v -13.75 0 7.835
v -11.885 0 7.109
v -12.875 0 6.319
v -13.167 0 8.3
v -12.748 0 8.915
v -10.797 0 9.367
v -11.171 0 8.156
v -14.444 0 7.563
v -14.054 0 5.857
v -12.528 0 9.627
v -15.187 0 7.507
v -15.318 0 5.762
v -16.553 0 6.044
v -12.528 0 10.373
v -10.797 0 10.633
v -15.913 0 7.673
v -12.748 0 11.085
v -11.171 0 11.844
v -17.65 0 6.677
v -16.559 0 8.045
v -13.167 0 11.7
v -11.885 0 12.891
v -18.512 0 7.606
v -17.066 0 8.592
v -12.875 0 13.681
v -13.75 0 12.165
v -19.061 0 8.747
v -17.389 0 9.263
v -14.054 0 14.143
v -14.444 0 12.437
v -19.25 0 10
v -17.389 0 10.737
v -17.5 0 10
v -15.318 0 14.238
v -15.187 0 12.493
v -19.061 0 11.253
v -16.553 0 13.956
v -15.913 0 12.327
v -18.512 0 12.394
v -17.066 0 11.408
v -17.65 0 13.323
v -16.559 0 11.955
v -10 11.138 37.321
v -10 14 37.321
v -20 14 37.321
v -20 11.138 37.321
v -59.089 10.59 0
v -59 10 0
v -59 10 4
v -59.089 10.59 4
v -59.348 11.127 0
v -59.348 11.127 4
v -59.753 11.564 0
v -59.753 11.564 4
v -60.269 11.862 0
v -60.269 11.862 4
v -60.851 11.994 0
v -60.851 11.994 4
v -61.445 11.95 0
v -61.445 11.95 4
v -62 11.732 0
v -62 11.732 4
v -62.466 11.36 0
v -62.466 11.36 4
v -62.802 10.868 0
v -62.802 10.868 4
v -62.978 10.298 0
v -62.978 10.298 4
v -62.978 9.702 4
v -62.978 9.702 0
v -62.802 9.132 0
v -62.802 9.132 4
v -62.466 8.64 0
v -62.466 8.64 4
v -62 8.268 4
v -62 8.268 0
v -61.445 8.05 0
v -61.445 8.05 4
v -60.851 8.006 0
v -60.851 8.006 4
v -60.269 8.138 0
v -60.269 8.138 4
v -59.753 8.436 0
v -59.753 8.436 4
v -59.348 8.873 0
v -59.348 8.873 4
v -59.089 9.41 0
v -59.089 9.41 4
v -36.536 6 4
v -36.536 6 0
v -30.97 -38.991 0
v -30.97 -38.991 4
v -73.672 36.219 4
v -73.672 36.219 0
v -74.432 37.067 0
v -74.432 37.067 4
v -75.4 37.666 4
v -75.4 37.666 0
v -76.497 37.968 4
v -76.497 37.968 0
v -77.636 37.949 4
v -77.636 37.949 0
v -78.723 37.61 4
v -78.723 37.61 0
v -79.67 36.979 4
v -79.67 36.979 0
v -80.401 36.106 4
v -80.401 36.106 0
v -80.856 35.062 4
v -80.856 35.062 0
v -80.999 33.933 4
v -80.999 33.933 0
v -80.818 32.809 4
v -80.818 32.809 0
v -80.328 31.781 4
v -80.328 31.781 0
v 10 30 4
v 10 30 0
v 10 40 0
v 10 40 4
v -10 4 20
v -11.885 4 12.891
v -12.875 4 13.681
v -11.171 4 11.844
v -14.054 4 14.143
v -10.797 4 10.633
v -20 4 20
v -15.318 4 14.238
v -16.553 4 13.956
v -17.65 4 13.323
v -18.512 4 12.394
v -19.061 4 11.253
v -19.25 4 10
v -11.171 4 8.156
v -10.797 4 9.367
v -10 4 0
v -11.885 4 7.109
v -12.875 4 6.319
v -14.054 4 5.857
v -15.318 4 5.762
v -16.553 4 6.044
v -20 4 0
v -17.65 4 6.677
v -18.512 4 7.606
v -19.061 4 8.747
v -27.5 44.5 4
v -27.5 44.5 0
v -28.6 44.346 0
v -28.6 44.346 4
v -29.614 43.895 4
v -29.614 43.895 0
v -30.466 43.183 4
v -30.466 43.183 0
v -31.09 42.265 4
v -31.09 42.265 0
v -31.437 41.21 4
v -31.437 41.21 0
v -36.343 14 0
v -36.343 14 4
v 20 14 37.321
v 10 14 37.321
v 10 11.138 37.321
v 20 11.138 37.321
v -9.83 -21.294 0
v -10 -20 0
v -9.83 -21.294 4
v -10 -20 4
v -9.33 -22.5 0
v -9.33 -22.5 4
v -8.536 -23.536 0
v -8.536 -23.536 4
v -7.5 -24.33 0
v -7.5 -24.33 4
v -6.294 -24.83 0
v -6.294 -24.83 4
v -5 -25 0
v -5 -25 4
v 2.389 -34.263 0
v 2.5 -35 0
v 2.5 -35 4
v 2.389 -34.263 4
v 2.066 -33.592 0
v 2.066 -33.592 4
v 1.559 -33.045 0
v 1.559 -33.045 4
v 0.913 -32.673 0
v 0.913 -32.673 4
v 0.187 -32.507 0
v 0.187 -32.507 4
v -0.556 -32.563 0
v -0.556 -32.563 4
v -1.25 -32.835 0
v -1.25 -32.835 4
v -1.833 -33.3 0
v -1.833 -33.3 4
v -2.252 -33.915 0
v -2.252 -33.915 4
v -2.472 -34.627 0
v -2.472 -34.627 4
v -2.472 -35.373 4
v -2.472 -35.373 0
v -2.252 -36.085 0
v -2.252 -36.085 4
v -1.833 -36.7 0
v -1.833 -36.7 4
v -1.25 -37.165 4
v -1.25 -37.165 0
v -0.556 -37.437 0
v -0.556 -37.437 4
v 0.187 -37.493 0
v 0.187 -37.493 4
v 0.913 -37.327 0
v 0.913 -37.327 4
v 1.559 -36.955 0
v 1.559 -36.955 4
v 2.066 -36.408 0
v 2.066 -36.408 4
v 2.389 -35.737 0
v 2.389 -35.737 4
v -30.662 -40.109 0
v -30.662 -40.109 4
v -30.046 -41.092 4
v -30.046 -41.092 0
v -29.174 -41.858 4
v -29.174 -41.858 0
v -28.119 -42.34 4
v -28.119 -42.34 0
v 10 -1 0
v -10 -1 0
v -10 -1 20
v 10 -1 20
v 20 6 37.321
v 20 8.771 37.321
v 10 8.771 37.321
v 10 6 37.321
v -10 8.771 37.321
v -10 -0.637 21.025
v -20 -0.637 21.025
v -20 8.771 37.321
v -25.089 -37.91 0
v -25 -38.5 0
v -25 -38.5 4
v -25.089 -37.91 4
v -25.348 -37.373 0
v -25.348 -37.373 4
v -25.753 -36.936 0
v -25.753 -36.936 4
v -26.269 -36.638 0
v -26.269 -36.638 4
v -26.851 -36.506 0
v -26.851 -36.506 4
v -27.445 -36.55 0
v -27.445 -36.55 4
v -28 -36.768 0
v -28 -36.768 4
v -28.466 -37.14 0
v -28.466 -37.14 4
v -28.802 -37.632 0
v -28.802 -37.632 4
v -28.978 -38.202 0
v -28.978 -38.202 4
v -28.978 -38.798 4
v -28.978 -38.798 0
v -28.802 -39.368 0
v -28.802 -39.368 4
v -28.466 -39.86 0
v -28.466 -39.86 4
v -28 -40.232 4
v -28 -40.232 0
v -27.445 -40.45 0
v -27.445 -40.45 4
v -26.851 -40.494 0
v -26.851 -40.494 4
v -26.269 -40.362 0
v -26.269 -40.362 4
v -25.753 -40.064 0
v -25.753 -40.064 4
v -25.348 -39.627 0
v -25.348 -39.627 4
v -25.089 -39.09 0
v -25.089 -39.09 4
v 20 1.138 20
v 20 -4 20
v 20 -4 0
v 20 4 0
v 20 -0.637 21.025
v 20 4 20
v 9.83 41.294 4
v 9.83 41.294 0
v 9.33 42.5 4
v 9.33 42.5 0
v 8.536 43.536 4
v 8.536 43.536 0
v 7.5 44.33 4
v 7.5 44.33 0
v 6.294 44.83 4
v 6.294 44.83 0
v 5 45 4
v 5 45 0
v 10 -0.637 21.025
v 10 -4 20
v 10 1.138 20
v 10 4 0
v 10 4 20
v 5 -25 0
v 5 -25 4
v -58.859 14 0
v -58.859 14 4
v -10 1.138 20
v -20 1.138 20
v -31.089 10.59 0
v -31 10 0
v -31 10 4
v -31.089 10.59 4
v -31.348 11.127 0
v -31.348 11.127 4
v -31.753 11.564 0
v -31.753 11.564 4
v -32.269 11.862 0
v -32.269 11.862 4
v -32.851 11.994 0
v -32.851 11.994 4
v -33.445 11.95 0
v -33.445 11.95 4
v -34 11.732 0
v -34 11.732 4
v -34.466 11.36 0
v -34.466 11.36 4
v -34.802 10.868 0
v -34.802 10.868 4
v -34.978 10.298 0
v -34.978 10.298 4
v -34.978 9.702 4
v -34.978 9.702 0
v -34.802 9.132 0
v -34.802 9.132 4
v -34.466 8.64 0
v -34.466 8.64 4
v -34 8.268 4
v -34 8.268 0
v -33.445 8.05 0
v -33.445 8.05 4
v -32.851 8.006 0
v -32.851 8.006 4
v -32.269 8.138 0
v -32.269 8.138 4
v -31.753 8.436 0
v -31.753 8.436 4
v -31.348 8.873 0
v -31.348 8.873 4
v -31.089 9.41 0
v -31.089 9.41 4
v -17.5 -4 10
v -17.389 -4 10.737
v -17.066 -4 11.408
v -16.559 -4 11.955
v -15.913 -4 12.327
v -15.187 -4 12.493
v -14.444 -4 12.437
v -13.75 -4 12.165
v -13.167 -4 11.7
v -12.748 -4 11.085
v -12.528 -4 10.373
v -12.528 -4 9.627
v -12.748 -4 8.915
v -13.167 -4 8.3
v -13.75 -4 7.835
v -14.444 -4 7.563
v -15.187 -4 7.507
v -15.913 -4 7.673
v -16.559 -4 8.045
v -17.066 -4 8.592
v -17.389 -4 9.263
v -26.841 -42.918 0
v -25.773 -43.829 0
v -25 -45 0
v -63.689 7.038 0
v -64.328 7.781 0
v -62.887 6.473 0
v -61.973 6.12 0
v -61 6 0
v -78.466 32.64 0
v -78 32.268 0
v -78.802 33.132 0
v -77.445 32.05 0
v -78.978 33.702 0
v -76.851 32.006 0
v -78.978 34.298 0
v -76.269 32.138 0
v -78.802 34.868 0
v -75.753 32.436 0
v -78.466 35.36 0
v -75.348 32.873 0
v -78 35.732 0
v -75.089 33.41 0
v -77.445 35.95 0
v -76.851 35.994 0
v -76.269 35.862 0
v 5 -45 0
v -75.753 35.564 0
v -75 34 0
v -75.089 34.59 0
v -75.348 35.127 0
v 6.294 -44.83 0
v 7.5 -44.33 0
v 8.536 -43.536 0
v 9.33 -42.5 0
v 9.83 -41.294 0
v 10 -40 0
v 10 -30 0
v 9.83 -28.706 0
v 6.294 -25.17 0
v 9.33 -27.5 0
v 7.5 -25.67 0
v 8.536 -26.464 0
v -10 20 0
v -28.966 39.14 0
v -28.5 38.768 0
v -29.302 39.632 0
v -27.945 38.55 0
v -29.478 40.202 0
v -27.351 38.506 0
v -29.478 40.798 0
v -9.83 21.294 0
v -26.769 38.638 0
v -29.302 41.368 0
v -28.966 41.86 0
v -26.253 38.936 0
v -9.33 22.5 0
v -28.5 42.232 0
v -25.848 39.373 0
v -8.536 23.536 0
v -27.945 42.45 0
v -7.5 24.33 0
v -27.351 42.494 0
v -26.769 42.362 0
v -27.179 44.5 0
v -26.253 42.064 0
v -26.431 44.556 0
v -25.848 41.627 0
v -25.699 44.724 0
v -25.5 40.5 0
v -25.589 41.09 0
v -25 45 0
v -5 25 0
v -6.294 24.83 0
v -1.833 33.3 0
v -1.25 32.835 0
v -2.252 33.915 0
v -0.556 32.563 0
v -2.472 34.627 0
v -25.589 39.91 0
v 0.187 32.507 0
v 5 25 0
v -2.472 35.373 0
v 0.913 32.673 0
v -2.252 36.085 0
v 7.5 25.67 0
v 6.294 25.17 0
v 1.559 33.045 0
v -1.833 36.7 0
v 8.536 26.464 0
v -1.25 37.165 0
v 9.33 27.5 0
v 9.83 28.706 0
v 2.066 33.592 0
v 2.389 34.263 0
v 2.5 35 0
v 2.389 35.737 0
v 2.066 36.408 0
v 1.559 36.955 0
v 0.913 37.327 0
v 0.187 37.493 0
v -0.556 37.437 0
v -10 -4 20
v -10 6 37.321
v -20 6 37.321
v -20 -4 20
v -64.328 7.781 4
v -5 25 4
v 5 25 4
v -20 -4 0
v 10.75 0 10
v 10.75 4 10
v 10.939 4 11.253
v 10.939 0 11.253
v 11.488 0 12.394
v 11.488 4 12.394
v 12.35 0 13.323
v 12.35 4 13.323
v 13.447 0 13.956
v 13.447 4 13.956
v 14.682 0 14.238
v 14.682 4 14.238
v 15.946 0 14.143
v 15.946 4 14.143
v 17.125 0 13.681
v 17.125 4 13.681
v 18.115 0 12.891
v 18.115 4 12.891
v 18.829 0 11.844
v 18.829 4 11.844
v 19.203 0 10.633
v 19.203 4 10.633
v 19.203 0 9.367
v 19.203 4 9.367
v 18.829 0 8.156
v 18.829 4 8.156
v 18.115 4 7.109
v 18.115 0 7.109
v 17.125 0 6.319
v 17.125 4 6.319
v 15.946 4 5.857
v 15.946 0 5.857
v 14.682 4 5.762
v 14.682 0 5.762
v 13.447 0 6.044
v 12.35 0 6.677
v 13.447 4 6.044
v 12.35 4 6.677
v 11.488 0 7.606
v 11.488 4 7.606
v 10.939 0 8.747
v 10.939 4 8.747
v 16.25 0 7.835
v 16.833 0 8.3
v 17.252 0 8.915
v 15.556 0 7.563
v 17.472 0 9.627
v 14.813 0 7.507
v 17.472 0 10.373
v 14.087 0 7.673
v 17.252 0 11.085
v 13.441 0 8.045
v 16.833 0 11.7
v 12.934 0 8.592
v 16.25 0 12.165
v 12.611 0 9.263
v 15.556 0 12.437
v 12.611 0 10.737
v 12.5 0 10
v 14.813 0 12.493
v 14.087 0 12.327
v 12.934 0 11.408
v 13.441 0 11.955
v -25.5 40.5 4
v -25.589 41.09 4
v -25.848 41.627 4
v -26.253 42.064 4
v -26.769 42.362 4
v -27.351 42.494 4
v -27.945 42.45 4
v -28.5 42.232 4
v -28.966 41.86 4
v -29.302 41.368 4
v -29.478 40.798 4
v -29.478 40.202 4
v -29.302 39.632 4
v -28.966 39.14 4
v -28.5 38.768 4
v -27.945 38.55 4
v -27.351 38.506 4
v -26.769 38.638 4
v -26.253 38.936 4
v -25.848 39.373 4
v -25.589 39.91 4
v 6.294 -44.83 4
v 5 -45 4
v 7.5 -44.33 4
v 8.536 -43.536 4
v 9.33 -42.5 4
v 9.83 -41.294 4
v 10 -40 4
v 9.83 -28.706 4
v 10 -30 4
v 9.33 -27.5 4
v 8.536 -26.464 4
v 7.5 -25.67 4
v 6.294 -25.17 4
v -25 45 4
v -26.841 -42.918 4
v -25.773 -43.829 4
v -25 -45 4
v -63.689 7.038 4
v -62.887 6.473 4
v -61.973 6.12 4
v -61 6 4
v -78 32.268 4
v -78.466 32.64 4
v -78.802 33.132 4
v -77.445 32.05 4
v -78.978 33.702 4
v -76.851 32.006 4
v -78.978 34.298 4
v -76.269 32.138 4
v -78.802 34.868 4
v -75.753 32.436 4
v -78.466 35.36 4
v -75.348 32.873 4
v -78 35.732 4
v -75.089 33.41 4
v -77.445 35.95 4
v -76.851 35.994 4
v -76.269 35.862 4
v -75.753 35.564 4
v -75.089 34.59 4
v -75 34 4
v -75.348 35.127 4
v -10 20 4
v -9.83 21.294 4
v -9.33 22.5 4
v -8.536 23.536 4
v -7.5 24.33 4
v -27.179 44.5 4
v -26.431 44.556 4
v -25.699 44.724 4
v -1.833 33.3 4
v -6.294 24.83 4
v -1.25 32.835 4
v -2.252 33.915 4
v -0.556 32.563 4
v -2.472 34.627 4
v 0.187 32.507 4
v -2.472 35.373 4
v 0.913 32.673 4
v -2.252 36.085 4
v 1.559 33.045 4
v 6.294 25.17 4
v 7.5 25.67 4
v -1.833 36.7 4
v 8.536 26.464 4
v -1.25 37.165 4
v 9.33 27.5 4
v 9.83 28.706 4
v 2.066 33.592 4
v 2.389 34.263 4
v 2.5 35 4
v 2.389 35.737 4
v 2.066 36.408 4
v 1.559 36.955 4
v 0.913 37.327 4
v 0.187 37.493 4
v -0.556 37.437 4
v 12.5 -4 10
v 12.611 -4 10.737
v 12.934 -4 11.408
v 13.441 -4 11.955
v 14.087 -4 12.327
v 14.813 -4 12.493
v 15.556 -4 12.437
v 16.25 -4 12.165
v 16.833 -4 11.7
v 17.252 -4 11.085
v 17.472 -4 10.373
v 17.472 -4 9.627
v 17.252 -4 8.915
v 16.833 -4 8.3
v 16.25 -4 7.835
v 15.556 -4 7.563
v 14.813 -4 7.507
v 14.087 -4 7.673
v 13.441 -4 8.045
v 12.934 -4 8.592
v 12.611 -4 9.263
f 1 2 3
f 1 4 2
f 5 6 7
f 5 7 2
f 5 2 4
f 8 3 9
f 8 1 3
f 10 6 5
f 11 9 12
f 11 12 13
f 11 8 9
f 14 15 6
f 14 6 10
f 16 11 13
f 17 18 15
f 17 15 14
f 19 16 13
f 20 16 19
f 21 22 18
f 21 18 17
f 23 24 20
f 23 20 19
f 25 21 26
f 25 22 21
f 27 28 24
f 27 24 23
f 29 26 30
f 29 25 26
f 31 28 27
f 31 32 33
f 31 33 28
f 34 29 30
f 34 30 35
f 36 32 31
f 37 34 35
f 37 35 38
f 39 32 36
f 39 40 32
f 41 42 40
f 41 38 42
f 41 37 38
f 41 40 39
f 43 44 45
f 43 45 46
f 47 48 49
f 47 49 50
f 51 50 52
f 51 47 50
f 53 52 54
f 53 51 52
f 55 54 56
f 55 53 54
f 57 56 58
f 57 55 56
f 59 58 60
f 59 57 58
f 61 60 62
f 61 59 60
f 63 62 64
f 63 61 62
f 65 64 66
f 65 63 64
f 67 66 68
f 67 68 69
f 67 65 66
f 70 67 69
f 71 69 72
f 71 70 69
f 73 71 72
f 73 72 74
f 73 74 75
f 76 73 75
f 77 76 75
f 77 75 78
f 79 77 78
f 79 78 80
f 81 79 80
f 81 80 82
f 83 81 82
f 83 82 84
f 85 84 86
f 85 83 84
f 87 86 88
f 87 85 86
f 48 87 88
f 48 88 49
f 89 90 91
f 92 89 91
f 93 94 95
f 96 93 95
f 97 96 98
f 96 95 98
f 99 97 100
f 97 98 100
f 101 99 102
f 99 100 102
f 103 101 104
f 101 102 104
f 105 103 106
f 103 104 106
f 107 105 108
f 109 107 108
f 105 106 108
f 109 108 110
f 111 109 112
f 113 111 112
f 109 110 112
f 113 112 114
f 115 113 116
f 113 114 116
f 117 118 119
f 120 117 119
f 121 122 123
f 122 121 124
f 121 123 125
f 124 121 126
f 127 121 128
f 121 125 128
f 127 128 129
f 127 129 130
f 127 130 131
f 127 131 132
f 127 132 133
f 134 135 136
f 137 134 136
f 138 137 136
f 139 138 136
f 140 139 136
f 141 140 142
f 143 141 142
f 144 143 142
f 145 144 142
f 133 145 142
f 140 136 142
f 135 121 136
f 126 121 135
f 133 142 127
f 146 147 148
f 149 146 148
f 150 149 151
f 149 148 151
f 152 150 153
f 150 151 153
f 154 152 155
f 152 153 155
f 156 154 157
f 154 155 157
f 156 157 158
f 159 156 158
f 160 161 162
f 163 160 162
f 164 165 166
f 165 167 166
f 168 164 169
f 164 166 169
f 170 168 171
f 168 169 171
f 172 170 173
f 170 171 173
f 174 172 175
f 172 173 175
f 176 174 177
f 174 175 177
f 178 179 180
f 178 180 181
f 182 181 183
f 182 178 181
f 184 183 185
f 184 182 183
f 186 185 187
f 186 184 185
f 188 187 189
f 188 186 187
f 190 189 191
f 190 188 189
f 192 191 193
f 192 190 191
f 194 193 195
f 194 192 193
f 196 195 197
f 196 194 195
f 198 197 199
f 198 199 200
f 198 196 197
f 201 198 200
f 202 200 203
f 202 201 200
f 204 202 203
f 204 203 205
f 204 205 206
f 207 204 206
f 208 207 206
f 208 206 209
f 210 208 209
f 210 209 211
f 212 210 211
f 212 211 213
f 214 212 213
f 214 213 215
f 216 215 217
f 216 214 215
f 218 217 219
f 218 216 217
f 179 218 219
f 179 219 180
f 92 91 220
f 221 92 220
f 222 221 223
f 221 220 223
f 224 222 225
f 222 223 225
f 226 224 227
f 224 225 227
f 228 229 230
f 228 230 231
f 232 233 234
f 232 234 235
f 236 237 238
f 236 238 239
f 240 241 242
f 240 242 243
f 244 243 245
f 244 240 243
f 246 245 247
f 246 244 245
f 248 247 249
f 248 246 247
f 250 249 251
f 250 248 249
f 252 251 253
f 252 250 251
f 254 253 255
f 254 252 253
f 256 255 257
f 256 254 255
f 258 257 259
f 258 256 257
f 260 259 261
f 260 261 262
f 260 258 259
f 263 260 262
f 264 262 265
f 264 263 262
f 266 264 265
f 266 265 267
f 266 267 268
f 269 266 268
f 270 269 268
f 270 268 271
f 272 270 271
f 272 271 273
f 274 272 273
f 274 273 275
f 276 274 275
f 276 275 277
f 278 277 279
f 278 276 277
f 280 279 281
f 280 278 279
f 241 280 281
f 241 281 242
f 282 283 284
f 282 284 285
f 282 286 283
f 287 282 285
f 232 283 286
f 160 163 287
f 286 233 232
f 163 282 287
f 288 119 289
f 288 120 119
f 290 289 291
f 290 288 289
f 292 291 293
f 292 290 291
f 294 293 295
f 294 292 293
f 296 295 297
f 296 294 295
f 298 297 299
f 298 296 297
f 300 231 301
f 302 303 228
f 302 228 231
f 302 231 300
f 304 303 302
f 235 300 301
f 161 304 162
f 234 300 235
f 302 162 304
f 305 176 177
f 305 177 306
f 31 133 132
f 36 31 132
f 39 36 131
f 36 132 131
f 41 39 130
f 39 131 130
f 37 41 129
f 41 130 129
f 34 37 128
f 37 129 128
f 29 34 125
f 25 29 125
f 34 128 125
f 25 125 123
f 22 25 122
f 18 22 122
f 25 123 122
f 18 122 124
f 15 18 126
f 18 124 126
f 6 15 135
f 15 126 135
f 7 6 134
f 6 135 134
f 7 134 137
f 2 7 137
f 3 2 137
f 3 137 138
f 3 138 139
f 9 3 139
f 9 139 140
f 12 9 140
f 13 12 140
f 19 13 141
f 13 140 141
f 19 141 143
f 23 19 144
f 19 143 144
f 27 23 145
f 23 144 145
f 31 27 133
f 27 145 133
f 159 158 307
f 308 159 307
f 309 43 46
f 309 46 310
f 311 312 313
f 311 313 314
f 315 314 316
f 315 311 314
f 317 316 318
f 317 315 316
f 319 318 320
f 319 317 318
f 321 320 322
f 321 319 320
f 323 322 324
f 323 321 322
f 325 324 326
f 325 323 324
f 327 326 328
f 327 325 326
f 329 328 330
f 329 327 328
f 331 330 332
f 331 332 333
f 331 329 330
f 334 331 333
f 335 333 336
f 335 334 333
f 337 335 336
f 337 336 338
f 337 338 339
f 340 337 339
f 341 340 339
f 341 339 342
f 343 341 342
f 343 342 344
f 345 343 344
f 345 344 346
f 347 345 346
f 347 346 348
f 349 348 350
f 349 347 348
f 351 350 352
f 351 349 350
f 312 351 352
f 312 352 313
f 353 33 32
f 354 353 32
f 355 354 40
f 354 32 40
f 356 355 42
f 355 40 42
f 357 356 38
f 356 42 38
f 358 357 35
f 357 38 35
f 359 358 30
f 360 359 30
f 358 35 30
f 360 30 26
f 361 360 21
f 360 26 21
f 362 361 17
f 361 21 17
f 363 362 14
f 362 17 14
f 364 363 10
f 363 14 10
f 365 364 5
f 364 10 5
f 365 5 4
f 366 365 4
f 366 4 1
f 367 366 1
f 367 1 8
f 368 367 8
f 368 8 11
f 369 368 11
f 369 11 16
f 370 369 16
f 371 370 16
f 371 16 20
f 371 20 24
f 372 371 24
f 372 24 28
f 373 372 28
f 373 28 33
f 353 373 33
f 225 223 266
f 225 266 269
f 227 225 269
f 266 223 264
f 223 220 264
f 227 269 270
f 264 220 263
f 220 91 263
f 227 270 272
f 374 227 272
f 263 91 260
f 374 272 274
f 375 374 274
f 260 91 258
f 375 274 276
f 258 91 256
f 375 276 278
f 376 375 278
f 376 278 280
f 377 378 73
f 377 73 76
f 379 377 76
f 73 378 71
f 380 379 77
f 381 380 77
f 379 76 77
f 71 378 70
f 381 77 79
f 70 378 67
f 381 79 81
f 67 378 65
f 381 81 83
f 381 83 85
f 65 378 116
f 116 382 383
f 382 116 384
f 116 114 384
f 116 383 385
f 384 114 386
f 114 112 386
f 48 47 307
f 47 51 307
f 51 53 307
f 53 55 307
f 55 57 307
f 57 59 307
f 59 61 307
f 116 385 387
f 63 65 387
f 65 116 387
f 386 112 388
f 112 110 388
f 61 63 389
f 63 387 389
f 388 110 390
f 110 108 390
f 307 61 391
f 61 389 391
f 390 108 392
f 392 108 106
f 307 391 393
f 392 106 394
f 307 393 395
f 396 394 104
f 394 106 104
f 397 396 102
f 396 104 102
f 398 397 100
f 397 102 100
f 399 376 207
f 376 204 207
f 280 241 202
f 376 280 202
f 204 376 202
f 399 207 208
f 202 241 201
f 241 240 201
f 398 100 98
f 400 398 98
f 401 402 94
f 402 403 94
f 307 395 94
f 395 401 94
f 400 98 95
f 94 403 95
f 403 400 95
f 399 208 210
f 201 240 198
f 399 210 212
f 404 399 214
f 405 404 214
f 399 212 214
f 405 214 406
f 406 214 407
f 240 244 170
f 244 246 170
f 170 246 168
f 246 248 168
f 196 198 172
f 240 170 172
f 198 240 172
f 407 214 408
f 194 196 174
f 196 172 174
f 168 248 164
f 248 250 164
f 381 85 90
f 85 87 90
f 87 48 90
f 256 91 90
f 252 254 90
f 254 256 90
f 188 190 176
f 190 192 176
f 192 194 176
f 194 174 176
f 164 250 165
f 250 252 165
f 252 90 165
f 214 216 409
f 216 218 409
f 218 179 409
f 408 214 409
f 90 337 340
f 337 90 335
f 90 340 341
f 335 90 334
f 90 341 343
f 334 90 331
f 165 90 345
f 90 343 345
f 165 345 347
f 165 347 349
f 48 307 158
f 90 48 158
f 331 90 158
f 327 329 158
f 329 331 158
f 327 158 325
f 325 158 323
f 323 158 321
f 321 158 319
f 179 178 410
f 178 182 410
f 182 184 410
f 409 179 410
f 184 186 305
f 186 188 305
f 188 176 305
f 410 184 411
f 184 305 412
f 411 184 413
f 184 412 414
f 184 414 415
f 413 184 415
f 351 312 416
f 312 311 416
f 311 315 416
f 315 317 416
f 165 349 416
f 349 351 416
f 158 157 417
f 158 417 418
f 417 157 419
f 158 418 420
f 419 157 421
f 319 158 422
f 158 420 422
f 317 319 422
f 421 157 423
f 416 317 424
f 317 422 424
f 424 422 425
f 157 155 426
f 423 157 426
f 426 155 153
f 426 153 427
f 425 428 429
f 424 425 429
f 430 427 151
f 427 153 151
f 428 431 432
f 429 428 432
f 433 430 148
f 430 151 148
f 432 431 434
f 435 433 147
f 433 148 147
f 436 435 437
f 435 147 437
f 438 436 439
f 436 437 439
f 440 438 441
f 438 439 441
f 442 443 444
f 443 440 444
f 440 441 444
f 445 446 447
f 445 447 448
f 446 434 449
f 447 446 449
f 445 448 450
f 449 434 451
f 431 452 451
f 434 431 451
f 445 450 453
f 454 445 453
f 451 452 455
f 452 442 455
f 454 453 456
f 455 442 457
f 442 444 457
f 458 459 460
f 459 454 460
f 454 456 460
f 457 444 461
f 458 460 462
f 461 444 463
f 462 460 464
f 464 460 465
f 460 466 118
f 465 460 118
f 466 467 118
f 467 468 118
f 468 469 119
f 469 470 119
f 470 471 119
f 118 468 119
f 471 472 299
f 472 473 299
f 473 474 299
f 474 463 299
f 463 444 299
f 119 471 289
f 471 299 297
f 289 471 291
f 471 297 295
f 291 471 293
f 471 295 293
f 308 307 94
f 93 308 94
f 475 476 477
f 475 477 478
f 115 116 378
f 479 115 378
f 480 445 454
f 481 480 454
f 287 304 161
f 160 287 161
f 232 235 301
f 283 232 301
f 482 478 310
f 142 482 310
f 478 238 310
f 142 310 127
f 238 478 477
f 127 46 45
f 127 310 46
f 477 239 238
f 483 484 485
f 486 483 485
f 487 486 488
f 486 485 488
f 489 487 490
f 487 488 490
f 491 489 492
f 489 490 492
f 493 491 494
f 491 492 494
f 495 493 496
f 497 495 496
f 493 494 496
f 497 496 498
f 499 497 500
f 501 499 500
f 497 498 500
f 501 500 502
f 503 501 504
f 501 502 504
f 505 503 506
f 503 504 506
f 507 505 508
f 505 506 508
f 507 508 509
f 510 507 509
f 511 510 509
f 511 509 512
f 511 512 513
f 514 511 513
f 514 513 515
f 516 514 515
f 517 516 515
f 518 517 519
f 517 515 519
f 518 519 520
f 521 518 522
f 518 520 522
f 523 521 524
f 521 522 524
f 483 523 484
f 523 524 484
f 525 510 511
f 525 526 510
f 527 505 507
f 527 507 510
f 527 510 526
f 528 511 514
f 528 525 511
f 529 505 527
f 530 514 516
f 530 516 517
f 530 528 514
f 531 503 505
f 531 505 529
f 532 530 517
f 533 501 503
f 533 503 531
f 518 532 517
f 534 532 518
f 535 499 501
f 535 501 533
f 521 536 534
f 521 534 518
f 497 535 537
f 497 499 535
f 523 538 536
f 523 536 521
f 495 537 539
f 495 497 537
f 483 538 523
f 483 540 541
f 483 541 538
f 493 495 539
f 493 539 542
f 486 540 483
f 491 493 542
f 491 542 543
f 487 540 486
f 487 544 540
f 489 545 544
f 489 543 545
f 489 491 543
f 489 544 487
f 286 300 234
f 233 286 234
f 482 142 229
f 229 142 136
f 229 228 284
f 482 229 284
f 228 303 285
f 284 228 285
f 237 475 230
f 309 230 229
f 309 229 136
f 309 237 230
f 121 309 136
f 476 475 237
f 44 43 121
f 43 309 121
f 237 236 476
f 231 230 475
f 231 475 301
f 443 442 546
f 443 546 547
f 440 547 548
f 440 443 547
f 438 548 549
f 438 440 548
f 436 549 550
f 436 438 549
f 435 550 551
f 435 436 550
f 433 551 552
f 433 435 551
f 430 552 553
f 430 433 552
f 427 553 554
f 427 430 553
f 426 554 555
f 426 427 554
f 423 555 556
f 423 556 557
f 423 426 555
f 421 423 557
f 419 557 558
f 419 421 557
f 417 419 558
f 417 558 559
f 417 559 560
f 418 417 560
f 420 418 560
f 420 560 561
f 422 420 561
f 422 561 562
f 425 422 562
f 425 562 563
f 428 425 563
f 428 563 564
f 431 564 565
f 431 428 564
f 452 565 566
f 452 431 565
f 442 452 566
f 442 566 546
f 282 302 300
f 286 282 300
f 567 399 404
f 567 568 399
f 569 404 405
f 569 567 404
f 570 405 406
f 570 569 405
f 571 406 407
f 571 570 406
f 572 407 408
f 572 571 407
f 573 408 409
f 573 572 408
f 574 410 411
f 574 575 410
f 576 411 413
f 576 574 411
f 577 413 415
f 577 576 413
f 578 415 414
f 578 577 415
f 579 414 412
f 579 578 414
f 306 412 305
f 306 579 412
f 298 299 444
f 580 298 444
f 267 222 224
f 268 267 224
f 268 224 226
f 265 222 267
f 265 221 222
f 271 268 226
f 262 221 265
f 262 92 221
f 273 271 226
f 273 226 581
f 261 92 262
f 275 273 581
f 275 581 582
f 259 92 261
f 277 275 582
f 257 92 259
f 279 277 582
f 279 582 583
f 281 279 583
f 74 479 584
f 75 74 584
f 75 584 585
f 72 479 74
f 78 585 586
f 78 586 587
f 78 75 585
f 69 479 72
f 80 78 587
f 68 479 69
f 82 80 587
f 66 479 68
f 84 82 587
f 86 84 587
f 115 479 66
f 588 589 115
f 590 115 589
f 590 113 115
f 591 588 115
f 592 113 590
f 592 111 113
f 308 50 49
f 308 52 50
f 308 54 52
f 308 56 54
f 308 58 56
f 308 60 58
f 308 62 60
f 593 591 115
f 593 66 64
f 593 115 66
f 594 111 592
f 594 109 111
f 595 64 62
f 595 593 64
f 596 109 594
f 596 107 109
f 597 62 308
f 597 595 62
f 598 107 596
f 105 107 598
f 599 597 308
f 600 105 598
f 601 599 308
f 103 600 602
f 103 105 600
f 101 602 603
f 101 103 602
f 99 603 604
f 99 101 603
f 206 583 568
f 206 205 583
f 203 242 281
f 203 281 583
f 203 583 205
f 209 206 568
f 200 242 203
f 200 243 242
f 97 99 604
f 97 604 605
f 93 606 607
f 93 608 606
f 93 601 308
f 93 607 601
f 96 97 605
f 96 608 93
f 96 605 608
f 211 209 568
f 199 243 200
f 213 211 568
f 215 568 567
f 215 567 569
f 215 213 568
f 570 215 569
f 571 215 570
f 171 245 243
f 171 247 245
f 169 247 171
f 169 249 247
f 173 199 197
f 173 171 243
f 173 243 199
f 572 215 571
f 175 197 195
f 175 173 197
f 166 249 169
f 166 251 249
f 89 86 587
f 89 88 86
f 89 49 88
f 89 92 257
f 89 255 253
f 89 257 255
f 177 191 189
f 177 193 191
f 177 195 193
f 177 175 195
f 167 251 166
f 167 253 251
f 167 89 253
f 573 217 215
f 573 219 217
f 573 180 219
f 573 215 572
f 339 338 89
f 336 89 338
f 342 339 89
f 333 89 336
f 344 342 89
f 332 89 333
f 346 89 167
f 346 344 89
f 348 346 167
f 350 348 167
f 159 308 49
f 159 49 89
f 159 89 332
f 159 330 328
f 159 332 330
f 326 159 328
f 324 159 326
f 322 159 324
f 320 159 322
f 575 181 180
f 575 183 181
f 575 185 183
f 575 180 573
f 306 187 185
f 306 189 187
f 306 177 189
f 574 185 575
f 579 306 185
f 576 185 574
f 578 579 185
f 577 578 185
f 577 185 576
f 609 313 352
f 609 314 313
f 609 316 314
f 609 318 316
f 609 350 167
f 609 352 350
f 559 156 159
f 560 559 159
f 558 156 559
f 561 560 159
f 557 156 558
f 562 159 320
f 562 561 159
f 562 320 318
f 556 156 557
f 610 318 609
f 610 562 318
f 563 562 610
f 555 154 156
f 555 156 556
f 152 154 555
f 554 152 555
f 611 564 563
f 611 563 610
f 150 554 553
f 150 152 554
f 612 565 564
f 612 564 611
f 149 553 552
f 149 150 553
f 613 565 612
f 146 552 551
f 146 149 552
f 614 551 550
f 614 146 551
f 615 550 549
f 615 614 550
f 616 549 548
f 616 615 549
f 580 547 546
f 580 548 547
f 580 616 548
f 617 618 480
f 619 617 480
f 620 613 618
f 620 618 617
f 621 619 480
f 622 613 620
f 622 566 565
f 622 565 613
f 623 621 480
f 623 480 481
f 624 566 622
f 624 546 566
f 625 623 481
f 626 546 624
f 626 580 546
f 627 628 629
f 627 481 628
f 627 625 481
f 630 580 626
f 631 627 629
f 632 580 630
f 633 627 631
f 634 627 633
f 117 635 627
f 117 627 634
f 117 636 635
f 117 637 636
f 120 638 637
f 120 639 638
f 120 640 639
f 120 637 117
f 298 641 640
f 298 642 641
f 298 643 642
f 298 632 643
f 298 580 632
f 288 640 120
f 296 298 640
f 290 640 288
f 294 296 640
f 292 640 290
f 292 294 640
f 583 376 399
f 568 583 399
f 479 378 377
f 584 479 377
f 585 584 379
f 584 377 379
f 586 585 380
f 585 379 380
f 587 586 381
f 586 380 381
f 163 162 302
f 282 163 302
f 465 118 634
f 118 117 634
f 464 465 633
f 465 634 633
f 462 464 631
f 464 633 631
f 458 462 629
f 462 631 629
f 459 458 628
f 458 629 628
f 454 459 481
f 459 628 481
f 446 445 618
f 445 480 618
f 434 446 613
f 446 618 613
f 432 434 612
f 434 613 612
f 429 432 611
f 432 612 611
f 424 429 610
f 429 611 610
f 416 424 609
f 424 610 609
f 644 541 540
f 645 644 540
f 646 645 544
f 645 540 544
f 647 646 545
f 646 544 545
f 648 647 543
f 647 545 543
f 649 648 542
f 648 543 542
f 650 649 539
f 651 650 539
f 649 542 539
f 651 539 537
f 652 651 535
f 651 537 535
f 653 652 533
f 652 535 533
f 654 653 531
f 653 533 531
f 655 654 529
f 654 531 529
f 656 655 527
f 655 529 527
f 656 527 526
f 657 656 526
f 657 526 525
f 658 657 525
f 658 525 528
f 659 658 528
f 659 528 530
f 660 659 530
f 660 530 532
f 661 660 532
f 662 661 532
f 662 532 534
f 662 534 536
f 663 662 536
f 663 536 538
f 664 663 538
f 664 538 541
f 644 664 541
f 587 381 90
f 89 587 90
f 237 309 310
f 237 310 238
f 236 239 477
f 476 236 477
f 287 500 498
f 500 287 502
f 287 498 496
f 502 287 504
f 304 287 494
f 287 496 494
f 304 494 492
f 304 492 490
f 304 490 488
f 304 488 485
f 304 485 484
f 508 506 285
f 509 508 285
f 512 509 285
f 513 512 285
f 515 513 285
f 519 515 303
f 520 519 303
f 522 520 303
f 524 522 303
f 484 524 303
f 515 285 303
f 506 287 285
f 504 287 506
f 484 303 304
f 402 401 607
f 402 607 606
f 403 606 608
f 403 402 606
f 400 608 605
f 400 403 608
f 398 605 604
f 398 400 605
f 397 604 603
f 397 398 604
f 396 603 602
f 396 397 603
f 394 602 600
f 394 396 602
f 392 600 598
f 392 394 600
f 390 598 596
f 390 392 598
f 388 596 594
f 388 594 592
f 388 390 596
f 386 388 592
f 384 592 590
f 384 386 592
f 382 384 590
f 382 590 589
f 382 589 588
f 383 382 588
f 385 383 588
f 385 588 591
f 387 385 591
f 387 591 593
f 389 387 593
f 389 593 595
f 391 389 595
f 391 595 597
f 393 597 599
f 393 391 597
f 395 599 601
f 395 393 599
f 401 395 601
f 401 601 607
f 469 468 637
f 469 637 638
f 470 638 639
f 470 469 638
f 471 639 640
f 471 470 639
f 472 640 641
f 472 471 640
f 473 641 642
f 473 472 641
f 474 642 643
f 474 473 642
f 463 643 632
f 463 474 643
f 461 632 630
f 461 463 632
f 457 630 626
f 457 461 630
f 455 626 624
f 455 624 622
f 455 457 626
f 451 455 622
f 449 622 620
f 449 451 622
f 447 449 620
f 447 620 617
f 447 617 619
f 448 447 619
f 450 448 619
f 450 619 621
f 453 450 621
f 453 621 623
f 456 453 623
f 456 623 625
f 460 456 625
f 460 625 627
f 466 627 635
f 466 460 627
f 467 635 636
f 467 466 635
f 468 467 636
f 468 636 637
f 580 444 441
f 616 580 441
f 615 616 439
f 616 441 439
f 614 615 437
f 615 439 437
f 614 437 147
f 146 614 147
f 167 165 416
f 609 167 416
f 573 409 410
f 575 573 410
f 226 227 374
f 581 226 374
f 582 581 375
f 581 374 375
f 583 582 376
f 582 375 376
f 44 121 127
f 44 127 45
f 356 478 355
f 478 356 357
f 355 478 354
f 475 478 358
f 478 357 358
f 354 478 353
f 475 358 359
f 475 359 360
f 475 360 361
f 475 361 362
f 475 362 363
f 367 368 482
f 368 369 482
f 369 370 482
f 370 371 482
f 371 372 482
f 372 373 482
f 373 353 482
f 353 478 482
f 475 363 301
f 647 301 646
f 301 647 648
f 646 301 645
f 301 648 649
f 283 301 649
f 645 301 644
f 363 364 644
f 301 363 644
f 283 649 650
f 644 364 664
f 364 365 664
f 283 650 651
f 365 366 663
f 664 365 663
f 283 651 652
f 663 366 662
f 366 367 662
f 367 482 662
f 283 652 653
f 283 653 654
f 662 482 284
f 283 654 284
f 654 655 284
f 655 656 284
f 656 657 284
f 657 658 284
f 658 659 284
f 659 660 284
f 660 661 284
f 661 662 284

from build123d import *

# Parameters (mm, degrees)
F0_W         = 20
F0_H         = 4
F1_DEPTH     = 20
F2_DEPTH     = 20
F4_START     = 10
F4_DEPTH     = 10
F5_START     = -10
F5_DEPTH     = 10
F6_R         = 2.5
F7_DEPTH     = 25
F6_R_2       = 4.25
F8_DEPTH     = 4
F9_DEPTH     = 1
F10_W        = 20
F10_H        = 20
F10_R        = 2.5
F10_R_2      = 2
F11_DEPTH    = 4
F12_T1_DEPTH = 4
F13_R        = 5


# Not quite as in the source:
# - a fillet or chamfer that OpenCascade refuses, or shapes differently, is made with other operations: its cross-section is extruded or revolved along the edge and cut away or added
# - ends of sketch curves that miss each other by under 0.0002 mm in the source are joined


with BuildPart() as f1:
    # F0 (on Top) → F1 (new body)
    with BuildSketch(Plane.XY):
        with Locations((0, -2)):
            Rectangle(F0_W, F0_H)
    extrude(amount=F1_DEPTH)

    # F0 (on Top) → F2 (join)
    with BuildSketch(Plane.XY):
        Polygon((-10, 4), (-20, 4), (-20, -4), (-10, -4), (-10, 0), align=None)
        Polygon((20, 4), (10, 4), (10, 0), (10, -4), (20, -4), align=None)
    extrude(amount=F2_DEPTH)

    # F3 (on Right) → F4 (join)
    with BuildSketch(Plane.YZ.offset(F4_START)):
        Polygon((-4, 20), (-1.2287187079, 20), (-0.636934682, 21.025), (8.7712812921, 37.3205080757), (6, 37.3205080757), align=None)
        Polygon((-1.2287187079, 20), (1.1384173958, 20), (-0.636934682, 21.025), align=None)
        Polygon((1.1384173958, 20), (4, 20), (14, 37.3205080757), (11.1384173958, 37.3205080757), align=None)
    extrude(amount=F4_DEPTH)

    # F3 (on Right) → F5 (join)
    with BuildSketch(Plane.YZ.offset(F5_START)):
        Polygon((1.1384173958, 20), (4, 20), (14, 37.3205080757), (11.1384173958, 37.3205080757), align=None)
        Polygon((-4, 20), (-1.2287187079, 20), (-0.636934682, 21.025), (8.7712812921, 37.3205080757), (6, 37.3205080757), align=None)
        Polygon((-1.2287187079, 20), (1.1384173958, 20), (-0.636934682, 21.025), align=None)
    extrude(amount=-F5_DEPTH)

    # F6 (on face) → F7 (cut)
    with BuildSketch(Plane(origin=(0, 4, 0), x_dir=(-1, 0, 0), z_dir=(0, 1, 0))):
        with Locations((-15, 10)):
            Circle(F6_R)
        with Locations((15, 10)):
            Circle(F6_R)
    extrude(amount=-F7_DEPTH, mode=Mode.SUBTRACT)

    # F6 (on face) → F8 (cut)
    with BuildSketch(Plane(origin=(0, 4, 0), x_dir=(-1, 0, 0), z_dir=(0, 1, 0))):
        with Locations((-15, 10)):
            Circle(F6_R_2)
        with Locations((-15, 10)):
            Circle(F6_R, mode=Mode.SUBTRACT)
        with Locations((15, 10)):
            Circle(F6_R_2)
        with Locations((15, 10)):
            Circle(F6_R, mode=Mode.SUBTRACT)
    extrude(amount=-F8_DEPTH, mode=Mode.SUBTRACT)

    # F9 (cut): a face of the model
    f9_faces = [f1.faces().sort_by_distance(p)[0] for p in [
        (0, 0, 10),
    ]]
    extrude(f9_faces, amount=-F9_DEPTH, mode=Mode.SUBTRACT)


with BuildPart() as f11:
    # F10 (on Top) → F11 (new body)
    with BuildSketch(Plane.XY):
        with Locations((0, 35)):
            Rectangle(F10_W, F10_H)
        with Locations((0, 35)):
            Circle(F10_R, mode=Mode.SUBTRACT)
        with BuildLine():
            Line((-10, 25), (-10, 45))
            Line((-10, 45), (-25, 45))
            Line((-25, 45), (-25, 44.5))
            Line((-25, 44.5), (-25, 43.6224989992))
            ThreePointArc((-25, 43.6224989992), (-23.8944487245, 42.2320508076), (-23.5, 40.5))
            ThreePointArc((-23.5, 40.5), (-23.5159046021, 40.1436520514), (-23.5634919302, 39.7901378891))
            Line((-23.5634919302, 39.7901378891), (-25, 31.8240476839))
            Line((-25, 31.8240476839), (-25, 14))
            Line((-25, 14), (-25, 6))
            Line((-25, 6), (-25, -22.0868501472))
            Line((-25, -22.0868501472), (-23.0302620717, -38.0088984006))
            ThreePointArc((-23.0302620717, -38.0088984006), (-23.0075726861, -38.2539834488), (-23, -38.5))
            ThreePointArc((-23, -38.5), (-23.5358983849, -40.5), (-25, -41.9641016151))
            Line((-25, -41.9641016151), (-25, -42.5))
            Line((-25, -42.5), (-25, -45))
            Line((-25, -45), (-10, -45))
            Line((-10, -45), (-10, -25))
            Line((-10, -25), (-10, 25))
        make_face()
        with Locations((0, -35)):
            Rectangle(F10_W, F10_H)
        with Locations((0, -35)):
            Circle(F10_R, mode=Mode.SUBTRACT)
        with BuildLine():
            Line((-36.5356474045, 6), (-30.9697379283, -38.9911015994))
            ThreePointArc((-30.9697379283, -38.9911015994), (-29.9970323987, -35.8508875446), (-27, -34.5))
            Line((-27, -34.5), (-25, -34.5))
            Line((-25, -34.5), (-25, -22.0868501472))
            Line((-25, -22.0868501472), (-28.4746618739, 6))
            Line((-28.4746618739, 6), (-33, 6))
            Line((-33, 6), (-36.5356474045, 6))
        make_face()
        Polygon((-25, 6), (-25, 14), (-28.2141725332, 14), (-28.9556634317, 9.8880959261), (-28.4746618739, 6), align=None)
        with BuildLine():
            Line((-25, -34.5), (-25, -35.0358983849))
            ThreePointArc((-25, -35.0358983849), (-23.665464799, -36.29072976), (-23.0302620717, -38.0088984006))
            Line((-23.0302620717, -38.0088984006), (-25, -22.0868501472))
            Line((-25, -22.0868501472), (-25, -34.5))
        make_face()
        with BuildLine():
            ThreePointArc((-27, -34.5), (-25.9647238196, -34.6362966948), (-25, -35.0358983849))
            Line((-25, -35.0358983849), (-25, -34.5))
            Line((-25, -34.5), (-27, -34.5))
        make_face()
        with BuildLine():
            Line((-25, -38.5), (-25, -41.9641016151))
            ThreePointArc((-25, -41.9641016151), (-23.5358983849, -40.5), (-23, -38.5))
            ThreePointArc((-23, -38.5), (-23.0075726861, -38.2539834488), (-23.0302620717, -38.0088984006))
            ThreePointArc((-23.0302620717, -38.0088984006), (-23.665464799, -36.29072976), (-25, -35.0358983849))
            Line((-25, -35.0358983849), (-25, -38.5))
        make_face()
        with BuildLine():
            ThreePointArc((-27, -42.5), (-25.9647238196, -42.3637033052), (-25, -41.9641016151))
            Line((-25, -41.9641016151), (-25, -38.5))
            Line((-25, -38.5), (-25, -35.0358983849))
            ThreePointArc((-25, -35.0358983849), (-25.9647238196, -34.6362966948), (-27, -34.5))
            ThreePointArc((-27, -34.5), (-29.9970323987, -35.8508875446), (-30.9697379283, -38.9911015994))
            ThreePointArc((-30.9697379283, -38.9911015994), (-29.6491124554, -41.4970323987), (-27, -42.5))
        make_face()
        with Locations((-27, -38.5)):
            Circle(F10_R_2, mode=Mode.SUBTRACT)
        with BuildLine():
            Line((-27, -42.5), (-25, -42.5))
            Line((-25, -42.5), (-25, -41.9641016151))
            ThreePointArc((-25, -41.9641016151), (-25.9647238196, -42.3637033052), (-27, -42.5))
        make_face()
        Polygon((-25, -22.0868501472), (-25, 6), (-28.4746618739, 6), align=None)
        Polygon((-25, 14), (-25, 31.8240476839), (-28.2141725332, 14), align=None)
        with BuildLine():
            Line((-28.4746618739, 6), (-28.9556634317, 9.8880959261))
            Line((-28.9556634317, 9.8880959261), (-29.0634919302, 9.2901378891))
            ThreePointArc((-29.0634919302, 9.2901378891), (-30.4347951781, 6.9308430764), (-33, 6))
            Line((-33, 6), (-28.4746618739, 6))
        make_face()
        with BuildLine():
            ThreePointArc((-33, 6), (-35.6491124554, 7.0029676013), (-36.9697379283, 9.5088984006))
            Line((-36.9697379283, 9.5088984006), (-36.5356474045, 6))
            Line((-36.5356474045, 6), (-33, 6))
        make_face()
        with BuildLine():
            Line((-33, 14), (-36.3432041846, 14))
            Line((-36.3432041846, 14), (-36.9365077488, 10.7098620531))
            ThreePointArc((-36.9365077488, 10.7098620531), (-35.5652048219, 13.0691569236), (-33, 14))
        make_face()
        with BuildLine():
            Line((-28.2141725332, 14), (-33, 14))
            ThreePointArc((-33, 14), (-30.3508875446, 12.9970323987), (-29.0302620717, 10.4911015994))
            Line((-29.0302620717, 10.4911015994), (-28.9556634317, 9.8880959261))
            Line((-28.9556634317, 9.8880959261), (-28.2141725332, 14))
        make_face()
        with BuildLine():
            ThreePointArc((-27.5, 36.5), (-30.5691569236, 37.9347951781), (-31.4365080698, 41.2098621109))
            Line((-31.4365080698, 41.2098621109), (-36.3432041846, 14))
            Line((-36.3432041846, 14), (-33, 14))
            Line((-33, 14), (-28.2141725332, 14))
            Line((-28.2141725332, 14), (-25, 31.8240476839))
            Line((-25, 31.8240476839), (-25, 36.5))
            Line((-25, 36.5), (-27.5, 36.5))
        make_face()
        with BuildLine():
            ThreePointArc((-23.5634919302, 39.7901378891), (-24.0630881272, 38.4536283871), (-25, 37.3775010008))
            Line((-25, 37.3775010008), (-25, 36.5))
            Line((-25, 36.5), (-25, 31.8240476839))
            Line((-25, 31.8240476839), (-23.5634919302, 39.7901378891))
        make_face()
        with BuildLine():
            Line((-25, 36.5), (-25, 37.3775010008))
            ThreePointArc((-25, 37.3775010008), (-26.1752351146, 36.7257453718), (-27.5, 36.5))
            Line((-27.5, 36.5), (-25, 36.5))
        make_face()
        with BuildLine():
            Line((-25, 37.3775010008), (-25, 43.6224989992))
            ThreePointArc((-25, 43.6224989992), (-26.1752351146, 44.2742546282), (-27.5, 44.5))
            ThreePointArc((-27.5, 44.5), (-30.0652048219, 43.5691569236), (-31.4365080698, 41.2098621109))
            ThreePointArc((-31.4365080698, 41.2098621109), (-30.5691569236, 37.9347951781), (-27.5, 36.5))
            ThreePointArc((-27.5, 36.5), (-26.1752351146, 36.7257453718), (-25, 37.3775010008))
        make_face()
        with Locations((-27.5, 40.5)):
            Circle(F10_R_2, mode=Mode.SUBTRACT)
        with BuildLine():
            ThreePointArc((-23.5, 40.5), (-23.8944487245, 42.2320508076), (-25, 43.6224989992))
            Line((-25, 43.6224989992), (-25, 37.3775010008))
            ThreePointArc((-25, 37.3775010008), (-24.0630881272, 38.4536283871), (-23.5634919302, 39.7901378891))
            ThreePointArc((-23.5634919302, 39.7901378891), (-23.5159046021, 40.1436520514), (-23.5, 40.5))
        make_face()
        with BuildLine():
            Line((-25, 43.6224989992), (-25, 44.5))
            Line((-25, 44.5), (-27.5, 44.5))
            ThreePointArc((-27.5, 44.5), (-26.1752351146, 44.2742546282), (-25, 43.6224989992))
        make_face()
        with BuildLine():
            Line((-36.9365077488, 10.7098620531), (-36.3432041846, 14))
            Line((-36.3432041846, 14), (-58.859264966, 14))
            Line((-58.859264966, 14), (-57.6717988226, 12.2188007849))
            ThreePointArc((-57.6717988226, 12.2188007849), (-57.171631894, 11.1591365948), (-57, 10))
            ThreePointArc((-57, 10), (-58.1715728753, 7.1715728753), (-61, 6))
            Line((-61, 6), (-36.5356474045, 6))
            Line((-36.5356474045, 6), (-36.9697379283, 9.5088984006))
            ThreePointArc((-36.9697379283, 9.5088984006), (-36.9984696952, 10.1106349684), (-36.9365077488, 10.7098620531))
        make_face()
        with BuildLine():
            ThreePointArc((-57, 10), (-57.171631894, 11.1591365948), (-57.6717988226, 12.2188007849))
            ThreePointArc((-57.6717988226, 12.2188007849), (-59.1125682979, 13.5266983951), (-61, 14))
            ThreePointArc((-61, 14), (-64.5266983951, 11.8874317021), (-64.3282011774, 7.7811992151))
            ThreePointArc((-64.3282011774, 7.7811992151), (-62.8874317021, 6.4733016049), (-61, 6))
            ThreePointArc((-61, 6), (-58.1715728753, 7.1715728753), (-57, 10))
        make_face()
        with Locations((-61, 10)):
            Circle(F10_R_2, mode=Mode.SUBTRACT)
        with BuildLine():
            Line((-57.6717988226, 12.2188007849), (-58.859264966, 14))
            Line((-58.859264966, 14), (-61, 14))
            ThreePointArc((-61, 14), (-59.1125682979, 13.5266983951), (-57.6717988226, 12.2188007849))
        make_face()
        with BuildLine():
            Line((-61, 14), (-58.859264966, 14))
            Line((-58.859264966, 14), (-73.6717988226, 36.2188007849))
            ThreePointArc((-73.6717988226, 36.2188007849), (-73.171631894, 35.1591365948), (-73, 34))
            ThreePointArc((-73, 34), (-75.8408634052, 30.171631894), (-80.3282011774, 31.7811992151))
            Line((-80.3282011774, 31.7811992151), (-64.3282011774, 7.7811992151))
            ThreePointArc((-64.3282011774, 7.7811992151), (-64.5266983951, 11.8874317021), (-61, 14))
        make_face()
        with BuildLine():
            ThreePointArc((-73, 34), (-73.171631894, 35.1591365948), (-73.6717988226, 36.2188007849))
            ThreePointArc((-73.6717988226, 36.2188007849), (-79.2188007849, 37.3282011774), (-80.3282011774, 31.7811992151))
            ThreePointArc((-80.3282011774, 31.7811992151), (-75.8408634052, 30.171631894), (-73, 34))
        make_face()
        with Locations((-77, 34)):
            Circle(F10_R_2, mode=Mode.SUBTRACT)
        with BuildLine():
            ThreePointArc((-33, 14), (-35.5652048219, 13.0691569236), (-36.9365080698, 10.7098621109))
            ThreePointArc((-36.9365080698, 10.7098621109), (-36.9984696952, 10.1106349684), (-36.9697379283, 9.5088984006))
            ThreePointArc((-36.9697379283, 9.5088984006), (-35.6491124554, 7.0029676013), (-33, 6))
            ThreePointArc((-33, 6), (-30.4347951781, 6.9308430764), (-29.0634919302, 9.2901378891))
            ThreePointArc((-29.0634919302, 9.2901378891), (-29.0159046021, 9.6436520514), (-29, 10))
            ThreePointArc((-29, 10), (-29.0075726861, 10.2460165512), (-29.0302620717, 10.4911015994))
            ThreePointArc((-29.0302620717, 10.4911015994), (-30.3508875446, 12.9970323987), (-33, 14))
        make_face()
        with Locations((-33, 10)):
            Circle(F10_R_2, mode=Mode.SUBTRACT)
        with BuildLine():
            Line((-28.9556634317, 9.8880959261), (-29.0302620717, 10.4911015994))
            ThreePointArc((-29.0302620717, 10.4911015994), (-29.0075726861, 10.2460165512), (-29, 10))
            ThreePointArc((-29, 10), (-29.0159046021, 9.6436520514), (-29.0634919302, 9.2901378891))
            Line((-29.0634919302, 9.2901378891), (-28.9556634317, 9.8880959261))
        make_face()
    extrude(amount=F11_DEPTH)

    # F12: fillet of radius 5 on 2 edges, made by hand

    # F12_s2 → F12_t1 (join)
    with BuildSketch(Plane.XY):
        with BuildLine():
            ThreePointArc((-28.1194295133, -42.340166346), (-26.2745879363, -43.335688946), (-25, -45))
            Line((-25, -45), (-24.5481283595, -44.7859625722))
            ThreePointArc((-24.5481283595, -44.7859625722), (-24.5, -43.75), (-24.5, -42.5))
            Line((-24.5, -42.5), (-25, -42))
            ThreePointArc((-25, -42), (-27, -42), (-27.9795008241, -41.8601455527))
            Line((-27.9795008241, -41.8601455527), (-28.1194295133, -42.340166346))
        make_face()
        with BuildLine():
            ThreePointArc((-25, 45), (-26.061415483, 44.6266028276), (-27.1794494718, 44.5))
            Line((-27.1794494718, 44.5), (-25, 44.5))
            Line((-25, 44.5), (-25, 45))
        make_face()
    extrude(amount=F12_T1_DEPTH)

    # F13
    f13_edges = [f11.edges().sort_by_distance(p)[0] for p in [
        (10, 45, 2),
        (10, 25, 2),
        (-10, 25, 2),
        (-10, -25, 2),
        (10, -25, 2),
        (10, -45, 2),
    ]]
    fillet(f13_edges, radius=F13_R)


solid = Compound([f1.part, f11.part])
